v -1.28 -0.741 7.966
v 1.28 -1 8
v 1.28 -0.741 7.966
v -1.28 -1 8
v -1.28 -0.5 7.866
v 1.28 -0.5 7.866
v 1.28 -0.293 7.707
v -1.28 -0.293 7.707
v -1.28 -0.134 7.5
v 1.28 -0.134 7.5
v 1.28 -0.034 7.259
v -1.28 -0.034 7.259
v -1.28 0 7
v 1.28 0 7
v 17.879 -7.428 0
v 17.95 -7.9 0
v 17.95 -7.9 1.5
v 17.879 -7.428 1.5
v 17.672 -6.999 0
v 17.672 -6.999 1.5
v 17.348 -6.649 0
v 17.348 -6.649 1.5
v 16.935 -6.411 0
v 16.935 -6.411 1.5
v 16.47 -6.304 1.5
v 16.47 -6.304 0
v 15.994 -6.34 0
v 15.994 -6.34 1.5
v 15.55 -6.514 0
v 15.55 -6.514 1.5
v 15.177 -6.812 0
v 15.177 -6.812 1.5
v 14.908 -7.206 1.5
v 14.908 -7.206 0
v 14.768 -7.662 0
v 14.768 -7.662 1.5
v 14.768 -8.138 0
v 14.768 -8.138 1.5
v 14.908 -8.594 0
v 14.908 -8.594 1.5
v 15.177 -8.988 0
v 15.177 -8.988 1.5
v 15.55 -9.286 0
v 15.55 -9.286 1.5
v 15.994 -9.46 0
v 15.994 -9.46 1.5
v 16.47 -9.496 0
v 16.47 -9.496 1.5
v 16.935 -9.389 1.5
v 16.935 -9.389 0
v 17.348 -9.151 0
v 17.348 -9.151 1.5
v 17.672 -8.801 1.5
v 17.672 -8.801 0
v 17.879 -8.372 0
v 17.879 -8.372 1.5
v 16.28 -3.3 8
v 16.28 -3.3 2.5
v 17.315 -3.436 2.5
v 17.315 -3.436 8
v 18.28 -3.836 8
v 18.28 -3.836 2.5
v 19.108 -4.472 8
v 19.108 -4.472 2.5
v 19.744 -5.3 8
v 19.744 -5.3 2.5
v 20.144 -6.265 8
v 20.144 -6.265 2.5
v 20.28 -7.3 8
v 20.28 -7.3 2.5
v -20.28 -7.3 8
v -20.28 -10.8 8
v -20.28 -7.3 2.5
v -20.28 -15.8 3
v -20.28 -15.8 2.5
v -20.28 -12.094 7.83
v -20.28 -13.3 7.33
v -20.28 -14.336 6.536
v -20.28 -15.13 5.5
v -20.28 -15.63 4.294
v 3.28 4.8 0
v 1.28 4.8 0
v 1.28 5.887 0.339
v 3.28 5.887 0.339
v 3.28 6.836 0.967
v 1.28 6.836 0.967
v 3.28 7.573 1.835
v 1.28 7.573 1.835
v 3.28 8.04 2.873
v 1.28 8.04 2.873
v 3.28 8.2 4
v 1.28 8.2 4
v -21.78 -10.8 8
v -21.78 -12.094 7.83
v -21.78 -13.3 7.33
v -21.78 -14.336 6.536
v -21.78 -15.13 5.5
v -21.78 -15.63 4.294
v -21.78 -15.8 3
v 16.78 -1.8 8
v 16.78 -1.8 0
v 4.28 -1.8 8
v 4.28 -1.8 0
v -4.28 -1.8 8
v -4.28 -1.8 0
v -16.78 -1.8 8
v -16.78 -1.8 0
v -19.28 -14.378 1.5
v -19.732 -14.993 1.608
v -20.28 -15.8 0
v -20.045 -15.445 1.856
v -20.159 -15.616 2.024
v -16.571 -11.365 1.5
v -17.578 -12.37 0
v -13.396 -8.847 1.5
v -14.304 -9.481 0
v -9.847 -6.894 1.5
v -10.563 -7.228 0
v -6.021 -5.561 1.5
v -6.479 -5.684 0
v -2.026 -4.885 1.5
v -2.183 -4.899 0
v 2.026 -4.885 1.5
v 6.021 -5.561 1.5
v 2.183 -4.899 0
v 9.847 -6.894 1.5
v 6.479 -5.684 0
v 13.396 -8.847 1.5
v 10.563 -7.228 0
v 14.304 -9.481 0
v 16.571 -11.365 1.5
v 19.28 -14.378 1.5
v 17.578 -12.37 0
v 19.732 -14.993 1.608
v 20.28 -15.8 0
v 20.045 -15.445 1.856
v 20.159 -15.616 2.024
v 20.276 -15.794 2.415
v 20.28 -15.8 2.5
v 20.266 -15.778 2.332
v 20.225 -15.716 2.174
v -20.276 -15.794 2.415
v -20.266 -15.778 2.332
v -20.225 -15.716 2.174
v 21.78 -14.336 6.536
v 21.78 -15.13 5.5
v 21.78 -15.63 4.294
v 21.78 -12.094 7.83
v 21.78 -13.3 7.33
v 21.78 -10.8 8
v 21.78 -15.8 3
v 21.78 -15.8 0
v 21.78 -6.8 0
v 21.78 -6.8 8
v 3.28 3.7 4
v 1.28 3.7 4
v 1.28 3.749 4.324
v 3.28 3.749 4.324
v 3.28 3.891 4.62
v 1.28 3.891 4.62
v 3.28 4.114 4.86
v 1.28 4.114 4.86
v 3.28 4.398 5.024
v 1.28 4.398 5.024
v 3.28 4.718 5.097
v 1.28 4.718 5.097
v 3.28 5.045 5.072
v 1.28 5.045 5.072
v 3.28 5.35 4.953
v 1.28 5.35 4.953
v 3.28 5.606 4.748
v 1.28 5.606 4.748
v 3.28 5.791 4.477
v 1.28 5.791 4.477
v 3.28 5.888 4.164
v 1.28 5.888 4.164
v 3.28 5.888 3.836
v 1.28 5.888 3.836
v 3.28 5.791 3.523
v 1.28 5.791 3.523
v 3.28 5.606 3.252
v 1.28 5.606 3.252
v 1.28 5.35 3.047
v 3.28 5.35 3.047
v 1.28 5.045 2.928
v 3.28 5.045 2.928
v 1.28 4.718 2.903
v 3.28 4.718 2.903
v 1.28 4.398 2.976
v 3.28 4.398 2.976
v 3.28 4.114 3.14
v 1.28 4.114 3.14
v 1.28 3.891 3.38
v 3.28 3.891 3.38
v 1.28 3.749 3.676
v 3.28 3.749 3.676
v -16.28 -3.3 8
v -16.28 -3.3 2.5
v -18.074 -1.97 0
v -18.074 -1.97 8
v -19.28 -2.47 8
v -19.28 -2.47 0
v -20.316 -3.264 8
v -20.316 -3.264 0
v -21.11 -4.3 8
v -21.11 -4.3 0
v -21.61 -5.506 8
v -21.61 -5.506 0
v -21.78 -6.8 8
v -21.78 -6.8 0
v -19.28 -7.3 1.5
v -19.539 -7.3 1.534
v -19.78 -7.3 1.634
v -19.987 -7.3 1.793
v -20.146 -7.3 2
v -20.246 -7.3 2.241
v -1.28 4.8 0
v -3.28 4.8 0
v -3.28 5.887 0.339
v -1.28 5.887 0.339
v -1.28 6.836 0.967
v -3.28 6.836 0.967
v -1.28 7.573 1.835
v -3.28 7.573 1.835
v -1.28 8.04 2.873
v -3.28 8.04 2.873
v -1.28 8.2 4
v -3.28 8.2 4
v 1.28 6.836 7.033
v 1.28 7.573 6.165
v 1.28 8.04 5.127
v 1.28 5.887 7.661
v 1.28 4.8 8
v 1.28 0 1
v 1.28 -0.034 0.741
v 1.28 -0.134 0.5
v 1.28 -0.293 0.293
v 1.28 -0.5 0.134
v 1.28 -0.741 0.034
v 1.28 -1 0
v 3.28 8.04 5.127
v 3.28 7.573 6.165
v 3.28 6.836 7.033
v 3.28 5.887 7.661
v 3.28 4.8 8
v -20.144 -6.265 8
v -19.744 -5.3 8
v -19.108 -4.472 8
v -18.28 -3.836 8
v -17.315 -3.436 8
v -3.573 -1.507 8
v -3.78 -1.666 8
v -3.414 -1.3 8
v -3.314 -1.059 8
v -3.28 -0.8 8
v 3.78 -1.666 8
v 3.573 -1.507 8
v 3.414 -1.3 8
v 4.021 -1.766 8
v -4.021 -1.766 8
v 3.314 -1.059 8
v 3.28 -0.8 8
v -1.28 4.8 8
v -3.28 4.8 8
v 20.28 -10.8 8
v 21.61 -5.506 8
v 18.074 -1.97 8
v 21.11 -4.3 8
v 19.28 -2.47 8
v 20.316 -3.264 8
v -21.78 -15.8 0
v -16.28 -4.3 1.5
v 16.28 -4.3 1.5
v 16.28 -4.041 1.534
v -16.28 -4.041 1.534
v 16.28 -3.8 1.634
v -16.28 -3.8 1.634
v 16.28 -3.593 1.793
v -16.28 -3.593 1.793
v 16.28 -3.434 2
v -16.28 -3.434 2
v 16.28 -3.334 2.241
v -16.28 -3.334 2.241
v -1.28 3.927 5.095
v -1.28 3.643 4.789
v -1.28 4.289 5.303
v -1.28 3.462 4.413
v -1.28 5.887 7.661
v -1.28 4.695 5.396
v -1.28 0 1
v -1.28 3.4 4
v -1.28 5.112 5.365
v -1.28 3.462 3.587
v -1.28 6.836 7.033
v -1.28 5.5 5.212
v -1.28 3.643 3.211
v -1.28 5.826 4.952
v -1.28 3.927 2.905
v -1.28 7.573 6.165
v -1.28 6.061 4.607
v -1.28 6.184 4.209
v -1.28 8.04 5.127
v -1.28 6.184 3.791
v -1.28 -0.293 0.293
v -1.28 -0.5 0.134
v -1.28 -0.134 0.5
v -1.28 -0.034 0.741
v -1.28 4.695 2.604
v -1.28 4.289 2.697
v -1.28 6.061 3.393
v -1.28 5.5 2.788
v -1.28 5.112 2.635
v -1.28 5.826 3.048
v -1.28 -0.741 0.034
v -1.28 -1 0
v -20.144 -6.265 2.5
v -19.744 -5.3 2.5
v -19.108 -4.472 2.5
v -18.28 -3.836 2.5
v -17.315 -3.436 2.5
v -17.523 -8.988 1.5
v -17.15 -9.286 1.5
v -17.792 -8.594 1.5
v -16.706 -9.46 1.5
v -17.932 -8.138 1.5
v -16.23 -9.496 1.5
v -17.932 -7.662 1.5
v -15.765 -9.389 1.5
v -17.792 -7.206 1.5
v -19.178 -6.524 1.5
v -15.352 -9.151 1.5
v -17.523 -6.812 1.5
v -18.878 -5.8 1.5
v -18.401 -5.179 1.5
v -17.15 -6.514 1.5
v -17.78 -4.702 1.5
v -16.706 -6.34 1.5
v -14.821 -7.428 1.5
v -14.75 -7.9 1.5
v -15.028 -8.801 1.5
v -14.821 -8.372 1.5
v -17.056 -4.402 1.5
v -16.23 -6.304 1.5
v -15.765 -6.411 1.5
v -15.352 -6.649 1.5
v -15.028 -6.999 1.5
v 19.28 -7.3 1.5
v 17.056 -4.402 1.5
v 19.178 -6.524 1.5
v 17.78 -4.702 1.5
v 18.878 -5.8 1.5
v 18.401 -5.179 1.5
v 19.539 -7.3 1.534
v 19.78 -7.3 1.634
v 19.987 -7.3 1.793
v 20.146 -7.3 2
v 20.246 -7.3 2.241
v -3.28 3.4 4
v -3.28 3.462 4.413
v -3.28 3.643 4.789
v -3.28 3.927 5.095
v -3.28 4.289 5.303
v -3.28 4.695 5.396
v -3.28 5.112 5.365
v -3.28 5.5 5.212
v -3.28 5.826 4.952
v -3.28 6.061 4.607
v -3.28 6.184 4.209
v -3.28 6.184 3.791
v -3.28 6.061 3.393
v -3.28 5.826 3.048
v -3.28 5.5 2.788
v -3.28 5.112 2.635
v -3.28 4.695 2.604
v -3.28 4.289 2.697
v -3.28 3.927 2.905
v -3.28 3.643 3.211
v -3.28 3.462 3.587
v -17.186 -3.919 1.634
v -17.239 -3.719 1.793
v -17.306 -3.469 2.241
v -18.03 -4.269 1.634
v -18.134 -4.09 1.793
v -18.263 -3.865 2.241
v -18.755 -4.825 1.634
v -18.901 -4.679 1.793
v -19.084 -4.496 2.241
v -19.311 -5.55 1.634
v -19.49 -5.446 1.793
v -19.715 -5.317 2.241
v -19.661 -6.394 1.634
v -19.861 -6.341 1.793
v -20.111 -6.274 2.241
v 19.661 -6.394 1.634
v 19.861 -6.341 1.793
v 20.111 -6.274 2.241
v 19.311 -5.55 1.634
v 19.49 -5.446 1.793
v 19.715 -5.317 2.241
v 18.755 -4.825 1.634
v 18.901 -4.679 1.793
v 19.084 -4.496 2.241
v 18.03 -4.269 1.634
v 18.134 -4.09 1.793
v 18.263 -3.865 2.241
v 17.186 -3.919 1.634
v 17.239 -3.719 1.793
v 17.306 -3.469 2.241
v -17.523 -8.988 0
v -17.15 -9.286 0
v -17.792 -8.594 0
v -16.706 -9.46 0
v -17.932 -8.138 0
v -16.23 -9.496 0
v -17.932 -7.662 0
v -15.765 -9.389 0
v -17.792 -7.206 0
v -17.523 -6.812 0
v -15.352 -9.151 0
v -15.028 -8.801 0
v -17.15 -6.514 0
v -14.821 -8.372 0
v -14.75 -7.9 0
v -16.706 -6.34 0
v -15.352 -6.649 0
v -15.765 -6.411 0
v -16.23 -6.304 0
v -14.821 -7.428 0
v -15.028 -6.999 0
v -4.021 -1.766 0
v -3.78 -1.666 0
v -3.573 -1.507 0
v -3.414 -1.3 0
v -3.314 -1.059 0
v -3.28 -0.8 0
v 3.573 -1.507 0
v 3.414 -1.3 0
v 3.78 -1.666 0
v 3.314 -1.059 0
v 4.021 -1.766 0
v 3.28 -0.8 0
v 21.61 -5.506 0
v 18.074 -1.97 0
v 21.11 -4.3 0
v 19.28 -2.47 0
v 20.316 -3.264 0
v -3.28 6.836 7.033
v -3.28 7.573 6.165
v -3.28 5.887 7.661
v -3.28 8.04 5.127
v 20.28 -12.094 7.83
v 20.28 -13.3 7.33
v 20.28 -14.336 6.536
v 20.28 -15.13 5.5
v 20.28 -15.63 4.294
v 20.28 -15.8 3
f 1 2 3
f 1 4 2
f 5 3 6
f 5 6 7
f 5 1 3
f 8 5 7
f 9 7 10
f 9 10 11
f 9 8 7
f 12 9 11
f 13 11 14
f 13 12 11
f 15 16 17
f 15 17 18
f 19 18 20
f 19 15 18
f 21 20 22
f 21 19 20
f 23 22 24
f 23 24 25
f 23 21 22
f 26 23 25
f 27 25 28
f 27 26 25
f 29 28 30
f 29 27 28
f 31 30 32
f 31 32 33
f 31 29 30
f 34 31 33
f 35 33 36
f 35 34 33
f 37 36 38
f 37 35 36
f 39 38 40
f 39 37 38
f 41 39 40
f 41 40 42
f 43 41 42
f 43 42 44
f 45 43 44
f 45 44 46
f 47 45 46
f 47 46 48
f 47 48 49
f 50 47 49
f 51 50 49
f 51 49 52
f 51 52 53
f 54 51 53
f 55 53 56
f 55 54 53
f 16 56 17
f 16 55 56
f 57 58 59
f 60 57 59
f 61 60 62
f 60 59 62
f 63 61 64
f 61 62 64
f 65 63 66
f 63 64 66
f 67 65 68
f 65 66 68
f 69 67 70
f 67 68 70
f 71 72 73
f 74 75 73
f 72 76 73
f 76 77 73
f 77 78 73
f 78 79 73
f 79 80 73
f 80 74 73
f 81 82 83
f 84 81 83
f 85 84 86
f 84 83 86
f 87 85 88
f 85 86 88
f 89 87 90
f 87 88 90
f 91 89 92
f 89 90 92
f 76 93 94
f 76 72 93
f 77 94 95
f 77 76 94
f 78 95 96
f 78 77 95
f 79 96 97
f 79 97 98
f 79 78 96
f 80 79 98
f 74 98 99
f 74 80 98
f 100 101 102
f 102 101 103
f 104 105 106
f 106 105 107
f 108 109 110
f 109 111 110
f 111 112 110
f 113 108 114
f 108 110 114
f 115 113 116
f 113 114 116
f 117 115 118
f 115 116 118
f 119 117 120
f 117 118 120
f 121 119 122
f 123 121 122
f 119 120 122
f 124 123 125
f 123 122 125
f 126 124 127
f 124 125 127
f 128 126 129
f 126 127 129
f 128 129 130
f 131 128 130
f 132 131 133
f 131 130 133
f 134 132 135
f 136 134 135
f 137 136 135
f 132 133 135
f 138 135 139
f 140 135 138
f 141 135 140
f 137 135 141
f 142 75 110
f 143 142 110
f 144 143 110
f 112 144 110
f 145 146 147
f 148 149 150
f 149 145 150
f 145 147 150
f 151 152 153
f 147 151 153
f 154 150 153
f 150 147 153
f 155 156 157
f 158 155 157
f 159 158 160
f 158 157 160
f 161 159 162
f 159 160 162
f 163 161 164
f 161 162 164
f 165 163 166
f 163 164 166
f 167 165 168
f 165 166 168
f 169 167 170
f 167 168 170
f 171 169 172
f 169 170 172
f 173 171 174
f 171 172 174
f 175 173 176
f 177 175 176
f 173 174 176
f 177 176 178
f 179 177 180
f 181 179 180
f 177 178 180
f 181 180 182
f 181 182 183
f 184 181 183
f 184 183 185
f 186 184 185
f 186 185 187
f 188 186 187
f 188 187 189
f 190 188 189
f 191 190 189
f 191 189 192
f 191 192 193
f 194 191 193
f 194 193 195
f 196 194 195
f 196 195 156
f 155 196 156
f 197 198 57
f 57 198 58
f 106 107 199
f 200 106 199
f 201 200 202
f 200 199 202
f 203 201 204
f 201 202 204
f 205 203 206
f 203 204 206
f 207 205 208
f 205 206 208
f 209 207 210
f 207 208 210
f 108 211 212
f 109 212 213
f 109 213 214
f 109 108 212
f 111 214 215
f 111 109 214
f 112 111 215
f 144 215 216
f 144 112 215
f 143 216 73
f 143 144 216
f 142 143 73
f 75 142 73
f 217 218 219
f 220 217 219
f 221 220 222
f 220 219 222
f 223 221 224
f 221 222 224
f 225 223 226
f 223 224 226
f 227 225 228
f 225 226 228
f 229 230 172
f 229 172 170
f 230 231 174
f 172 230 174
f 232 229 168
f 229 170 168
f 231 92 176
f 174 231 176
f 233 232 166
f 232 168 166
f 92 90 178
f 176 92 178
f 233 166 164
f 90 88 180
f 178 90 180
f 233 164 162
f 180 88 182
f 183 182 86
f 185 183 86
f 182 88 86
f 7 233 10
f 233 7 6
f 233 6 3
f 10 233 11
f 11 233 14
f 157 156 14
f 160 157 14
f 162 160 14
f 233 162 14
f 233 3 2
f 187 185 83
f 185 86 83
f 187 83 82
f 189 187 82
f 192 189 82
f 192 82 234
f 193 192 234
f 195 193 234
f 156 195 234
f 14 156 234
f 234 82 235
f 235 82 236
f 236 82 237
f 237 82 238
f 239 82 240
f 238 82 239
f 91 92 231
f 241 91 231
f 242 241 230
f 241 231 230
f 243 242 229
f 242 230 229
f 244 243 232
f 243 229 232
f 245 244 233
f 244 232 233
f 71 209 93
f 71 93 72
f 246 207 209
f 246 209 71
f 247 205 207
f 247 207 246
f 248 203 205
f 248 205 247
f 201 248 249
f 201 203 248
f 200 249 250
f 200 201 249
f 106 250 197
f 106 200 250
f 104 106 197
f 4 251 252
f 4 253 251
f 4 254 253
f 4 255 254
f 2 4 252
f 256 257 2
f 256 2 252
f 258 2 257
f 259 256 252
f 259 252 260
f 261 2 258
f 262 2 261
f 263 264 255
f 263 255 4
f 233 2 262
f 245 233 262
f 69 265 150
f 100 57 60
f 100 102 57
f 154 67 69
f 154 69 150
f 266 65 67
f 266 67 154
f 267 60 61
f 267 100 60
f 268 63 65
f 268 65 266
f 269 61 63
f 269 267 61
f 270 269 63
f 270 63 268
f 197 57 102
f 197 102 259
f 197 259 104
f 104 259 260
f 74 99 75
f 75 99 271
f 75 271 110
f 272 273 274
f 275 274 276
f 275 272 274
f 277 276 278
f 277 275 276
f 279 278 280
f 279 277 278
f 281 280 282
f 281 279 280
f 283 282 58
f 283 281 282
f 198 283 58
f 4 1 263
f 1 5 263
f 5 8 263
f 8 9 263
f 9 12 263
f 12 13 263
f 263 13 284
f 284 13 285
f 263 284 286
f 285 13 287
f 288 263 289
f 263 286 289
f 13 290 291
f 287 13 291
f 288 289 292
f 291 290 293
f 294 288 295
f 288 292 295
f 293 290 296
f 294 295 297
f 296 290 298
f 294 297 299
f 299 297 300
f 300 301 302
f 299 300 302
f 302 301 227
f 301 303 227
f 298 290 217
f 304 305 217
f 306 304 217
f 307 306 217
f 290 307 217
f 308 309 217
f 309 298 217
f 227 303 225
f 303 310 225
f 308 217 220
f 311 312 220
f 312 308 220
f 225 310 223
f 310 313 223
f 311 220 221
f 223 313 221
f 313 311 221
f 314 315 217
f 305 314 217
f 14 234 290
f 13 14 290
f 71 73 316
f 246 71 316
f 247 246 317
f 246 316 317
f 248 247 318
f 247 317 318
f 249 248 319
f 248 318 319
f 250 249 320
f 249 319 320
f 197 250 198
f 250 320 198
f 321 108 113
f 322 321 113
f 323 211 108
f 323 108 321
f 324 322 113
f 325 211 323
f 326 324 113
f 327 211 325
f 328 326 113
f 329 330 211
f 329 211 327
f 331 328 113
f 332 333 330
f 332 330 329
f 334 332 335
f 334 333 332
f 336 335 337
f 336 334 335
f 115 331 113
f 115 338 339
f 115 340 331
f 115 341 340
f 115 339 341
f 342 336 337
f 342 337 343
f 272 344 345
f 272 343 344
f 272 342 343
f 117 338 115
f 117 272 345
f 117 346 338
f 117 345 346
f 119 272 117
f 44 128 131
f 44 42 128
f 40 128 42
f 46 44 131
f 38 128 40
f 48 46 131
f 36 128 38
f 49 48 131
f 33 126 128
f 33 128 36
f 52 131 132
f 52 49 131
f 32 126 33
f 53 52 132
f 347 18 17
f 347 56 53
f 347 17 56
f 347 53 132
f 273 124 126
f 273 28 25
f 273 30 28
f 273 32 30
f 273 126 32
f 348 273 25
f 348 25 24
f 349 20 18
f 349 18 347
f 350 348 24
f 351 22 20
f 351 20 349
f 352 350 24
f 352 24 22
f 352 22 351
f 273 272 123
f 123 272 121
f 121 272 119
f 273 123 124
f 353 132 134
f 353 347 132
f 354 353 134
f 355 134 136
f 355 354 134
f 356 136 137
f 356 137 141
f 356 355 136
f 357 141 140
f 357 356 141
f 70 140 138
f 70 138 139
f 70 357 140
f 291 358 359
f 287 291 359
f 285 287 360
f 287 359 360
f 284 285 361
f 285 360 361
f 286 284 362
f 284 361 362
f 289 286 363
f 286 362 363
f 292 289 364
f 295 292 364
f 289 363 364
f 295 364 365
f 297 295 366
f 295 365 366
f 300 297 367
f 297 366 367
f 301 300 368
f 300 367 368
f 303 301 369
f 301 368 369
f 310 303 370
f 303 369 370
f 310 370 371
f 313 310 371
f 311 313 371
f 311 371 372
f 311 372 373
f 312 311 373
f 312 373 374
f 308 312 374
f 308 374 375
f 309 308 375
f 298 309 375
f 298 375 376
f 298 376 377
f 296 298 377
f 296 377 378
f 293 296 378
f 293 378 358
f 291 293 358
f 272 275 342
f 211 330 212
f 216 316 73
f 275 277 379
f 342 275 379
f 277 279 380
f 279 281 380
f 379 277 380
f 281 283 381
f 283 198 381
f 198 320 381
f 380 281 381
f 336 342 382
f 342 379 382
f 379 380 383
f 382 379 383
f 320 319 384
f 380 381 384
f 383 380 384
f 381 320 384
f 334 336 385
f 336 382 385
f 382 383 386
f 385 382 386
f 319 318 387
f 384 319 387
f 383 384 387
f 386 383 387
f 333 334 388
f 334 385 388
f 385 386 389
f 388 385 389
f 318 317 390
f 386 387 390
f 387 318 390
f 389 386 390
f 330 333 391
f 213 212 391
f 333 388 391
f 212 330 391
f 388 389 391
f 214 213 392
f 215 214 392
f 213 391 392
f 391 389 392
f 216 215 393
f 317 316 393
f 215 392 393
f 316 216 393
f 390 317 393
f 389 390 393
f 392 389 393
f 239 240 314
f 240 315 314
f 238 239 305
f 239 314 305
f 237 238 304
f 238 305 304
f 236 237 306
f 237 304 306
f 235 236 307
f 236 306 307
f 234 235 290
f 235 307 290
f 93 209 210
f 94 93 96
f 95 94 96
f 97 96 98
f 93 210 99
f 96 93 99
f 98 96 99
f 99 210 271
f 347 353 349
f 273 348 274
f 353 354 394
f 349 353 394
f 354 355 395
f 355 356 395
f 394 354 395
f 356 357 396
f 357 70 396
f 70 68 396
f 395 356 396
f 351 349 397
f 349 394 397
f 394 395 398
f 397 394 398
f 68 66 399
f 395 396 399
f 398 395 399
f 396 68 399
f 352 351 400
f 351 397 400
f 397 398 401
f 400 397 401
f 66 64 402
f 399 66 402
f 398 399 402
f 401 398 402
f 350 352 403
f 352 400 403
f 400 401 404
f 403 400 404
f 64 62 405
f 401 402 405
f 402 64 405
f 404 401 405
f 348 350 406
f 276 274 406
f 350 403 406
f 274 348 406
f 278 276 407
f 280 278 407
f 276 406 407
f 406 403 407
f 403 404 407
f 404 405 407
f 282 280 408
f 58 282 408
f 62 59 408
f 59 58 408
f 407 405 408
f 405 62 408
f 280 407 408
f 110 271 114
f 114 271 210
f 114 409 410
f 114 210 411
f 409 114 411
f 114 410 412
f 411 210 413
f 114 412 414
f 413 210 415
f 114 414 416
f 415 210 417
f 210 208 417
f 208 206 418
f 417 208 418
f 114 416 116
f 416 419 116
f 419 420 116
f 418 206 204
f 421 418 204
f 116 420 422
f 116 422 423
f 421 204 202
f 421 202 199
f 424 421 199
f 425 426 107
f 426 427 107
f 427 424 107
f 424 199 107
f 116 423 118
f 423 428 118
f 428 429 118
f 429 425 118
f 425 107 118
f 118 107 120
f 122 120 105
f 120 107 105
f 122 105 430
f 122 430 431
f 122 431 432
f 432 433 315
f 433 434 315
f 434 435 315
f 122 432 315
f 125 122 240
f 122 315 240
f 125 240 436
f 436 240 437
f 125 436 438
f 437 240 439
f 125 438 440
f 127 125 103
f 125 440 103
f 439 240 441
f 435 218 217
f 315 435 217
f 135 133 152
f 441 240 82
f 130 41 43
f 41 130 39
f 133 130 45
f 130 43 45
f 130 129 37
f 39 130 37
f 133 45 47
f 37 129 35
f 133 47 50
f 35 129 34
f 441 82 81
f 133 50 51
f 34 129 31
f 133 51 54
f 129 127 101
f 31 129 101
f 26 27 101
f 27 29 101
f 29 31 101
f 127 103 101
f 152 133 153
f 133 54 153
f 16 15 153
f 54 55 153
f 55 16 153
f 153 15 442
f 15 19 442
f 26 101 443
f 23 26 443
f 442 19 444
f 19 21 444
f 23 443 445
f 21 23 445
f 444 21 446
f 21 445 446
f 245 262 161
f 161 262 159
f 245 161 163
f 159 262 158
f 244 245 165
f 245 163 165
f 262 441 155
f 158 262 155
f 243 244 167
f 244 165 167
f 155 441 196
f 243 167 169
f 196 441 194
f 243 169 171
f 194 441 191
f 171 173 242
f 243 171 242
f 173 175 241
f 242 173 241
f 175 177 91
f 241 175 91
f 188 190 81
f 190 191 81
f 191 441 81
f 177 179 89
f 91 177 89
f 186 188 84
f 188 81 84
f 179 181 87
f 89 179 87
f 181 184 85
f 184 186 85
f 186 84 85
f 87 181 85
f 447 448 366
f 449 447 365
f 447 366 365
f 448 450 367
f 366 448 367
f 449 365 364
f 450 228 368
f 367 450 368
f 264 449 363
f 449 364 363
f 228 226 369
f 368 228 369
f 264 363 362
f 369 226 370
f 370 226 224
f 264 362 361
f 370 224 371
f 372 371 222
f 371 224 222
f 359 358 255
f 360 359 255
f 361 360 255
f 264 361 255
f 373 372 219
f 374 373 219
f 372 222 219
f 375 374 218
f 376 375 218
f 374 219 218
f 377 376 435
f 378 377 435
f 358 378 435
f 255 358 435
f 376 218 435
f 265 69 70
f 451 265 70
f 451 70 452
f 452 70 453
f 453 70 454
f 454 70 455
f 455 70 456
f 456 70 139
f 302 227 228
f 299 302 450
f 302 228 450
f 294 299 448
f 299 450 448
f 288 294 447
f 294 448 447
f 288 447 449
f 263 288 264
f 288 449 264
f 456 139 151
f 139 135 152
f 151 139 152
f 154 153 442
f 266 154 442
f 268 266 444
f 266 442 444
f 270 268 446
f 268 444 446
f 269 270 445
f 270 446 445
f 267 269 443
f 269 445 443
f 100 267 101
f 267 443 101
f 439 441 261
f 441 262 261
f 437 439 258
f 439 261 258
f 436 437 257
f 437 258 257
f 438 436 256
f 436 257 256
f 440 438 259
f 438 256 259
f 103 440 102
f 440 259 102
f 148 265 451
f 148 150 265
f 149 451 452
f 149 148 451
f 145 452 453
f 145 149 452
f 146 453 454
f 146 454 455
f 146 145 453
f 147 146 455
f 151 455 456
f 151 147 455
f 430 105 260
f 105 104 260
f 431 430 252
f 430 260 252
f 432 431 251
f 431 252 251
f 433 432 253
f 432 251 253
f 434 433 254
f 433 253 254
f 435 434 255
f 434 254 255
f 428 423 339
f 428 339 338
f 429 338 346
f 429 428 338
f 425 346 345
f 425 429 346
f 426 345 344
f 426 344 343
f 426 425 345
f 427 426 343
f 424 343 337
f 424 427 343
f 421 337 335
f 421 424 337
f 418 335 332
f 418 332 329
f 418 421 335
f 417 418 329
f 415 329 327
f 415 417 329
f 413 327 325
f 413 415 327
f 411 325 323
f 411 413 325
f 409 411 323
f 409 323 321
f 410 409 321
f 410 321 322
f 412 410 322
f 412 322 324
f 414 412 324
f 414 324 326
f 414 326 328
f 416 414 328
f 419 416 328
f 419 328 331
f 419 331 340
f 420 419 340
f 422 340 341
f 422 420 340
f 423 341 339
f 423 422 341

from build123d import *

# Parameters (mm, degrees)
F1_DEPTH = 8
F0_R     = 1.6
F2_DEPTH = 1.5
F3_R     = 1.1
F4_DEPTH = 8
F3_R_2   = 1.4
F5_DEPTH = 2.4
F6_R     = 1
F7_R     = 5


with BuildPart() as f1:
    # F0 (on Top) → F1 (new body)
    with BuildSketch(Plane.XY):
        with BuildLine():
            Line((1.28, 0), (0, 0))
            Line((0, 0), (-1.28, 0))
            Line((-1.28, 0), (-1.28, 8.2))
            Line((-1.28, 8.2), (-3.28, 8.2))
            Line((-3.28, 8.2), (-3.28, -1.8))
            Line((-3.28, -1.8), (-16.78, -1.8))
            ThreePointArc((-16.78, -1.8), (-20.3155339059, -3.2644660941), (-21.78, -6.8))
            Line((-21.78, -6.8), (-21.78, -15.8))
            Line((-21.78, -15.8), (-20.28, -15.8))
            Line((-20.28, -15.8), (-20.28, -7.3))
            ThreePointArc((-20.28, -7.3), (-19.1084271247, -4.4715728753), (-16.28, -3.3))
            Line((-16.28, -3.3), (0, -3.3))
            Line((0, -3.3), (16.28, -3.3))
            ThreePointArc((16.28, -3.3), (19.1084271247, -4.4715728753), (20.28, -7.3))
            Line((20.28, -7.3), (20.28, -15.8))
            Line((20.28, -15.8), (21.78, -15.8))
            Line((21.78, -15.8), (21.78, -6.8))
            ThreePointArc((21.78, -6.8), (20.3155339059, -3.2644660941), (16.78, -1.8))
            Line((16.78, -1.8), (3.28, -1.8))
            Line((3.28, -1.8), (3.28, 8.2))
            Line((3.28, 8.2), (1.28, 8.2))
            Line((1.28, 8.2), (1.28, 0))
        make_face()
    extrude(amount=F1_DEPTH)

    # F0 (on Top) → F2 (join)
    with BuildSketch(Plane.XY):
        with BuildLine():
            ThreePointArc((-20.28, -15.8), (0, -4.8), (20.28, -15.8))
            Line((20.28, -15.8), (20.28, -7.3))
            ThreePointArc((20.28, -7.3), (19.1084271247, -4.4715728753), (16.28, -3.3))
            Line((16.28, -3.3), (0, -3.3))
            Line((0, -3.3), (-16.28, -3.3))
            ThreePointArc((-16.28, -3.3), (-19.1084271247, -4.4715728753), (-20.28, -7.3))
            Line((-20.28, -7.3), (-20.28, -15.8))
        make_face()
        with Locations((-16.35, -7.9)):
            Circle(F0_R, mode=Mode.SUBTRACT)
        with Locations((16.35, -7.9)):
            Circle(F0_R, mode=Mode.SUBTRACT)
    extrude(amount=F2_DEPTH)

    # F3 (on face) → F4 (cut)
    with BuildSketch(Plane(origin=(-3.28, 0, 0), x_dir=(0, -1, 0), z_dir=(-1, 0, 0))):
        with Locations((-4.8, 4)):
            Circle(F3_R)
        with BuildLine():
            ThreePointArc((-4.8, 0), (-7.2351540584, 1.3751190503), (-8.2, 4))
            Line((-8.2, 4), (-8.2, 0))
            Line((-8.2, 0), (-4.8, 0))
        make_face()
        with BuildLine():
            ThreePointArc((-8.2, 4), (-7.2351540584, 6.6248809497), (-4.8, 8))
            Line((-4.8, 8), (-8.2, 8))
            Line((-8.2, 8), (-8.2, 4))
        make_face()
    extrude(amount=-F4_DEPTH, mode=Mode.SUBTRACT)

    # F3 (on face) → F5 (cut)
    with BuildSketch(Plane(origin=(-3.28, 0, 0), x_dir=(0, -1, 0), z_dir=(-1, 0, 0))):
        with Locations((-4.8, 4)):
            Circle(F3_R_2)
        with Locations((-4.8, 4)):
            Circle(F3_R, mode=Mode.SUBTRACT)
    extrude(amount=-F5_DEPTH, mode=Mode.SUBTRACT)

    # F6
    f6_edges = [f1.edges().sort_by_distance(p)[0] for p in [
        (-20.28, -11.55, 1.5),
        (-3.28, -1.8, 4),
        (3.28, -1.8, 4),
        (0, 0, 8),
        (0, 0, 0),
    ]]
    fillet(f6_edges, radius=F6_R)

    # F7
    f7_edges = [f1.edges().sort_by_distance(p)[0] for p in [
        (-21.03, -15.8, 8),
        (21.03, -15.8, 8),
    ]]
    fillet(f7_edges, radius=F7_R)


solid = f1.part
